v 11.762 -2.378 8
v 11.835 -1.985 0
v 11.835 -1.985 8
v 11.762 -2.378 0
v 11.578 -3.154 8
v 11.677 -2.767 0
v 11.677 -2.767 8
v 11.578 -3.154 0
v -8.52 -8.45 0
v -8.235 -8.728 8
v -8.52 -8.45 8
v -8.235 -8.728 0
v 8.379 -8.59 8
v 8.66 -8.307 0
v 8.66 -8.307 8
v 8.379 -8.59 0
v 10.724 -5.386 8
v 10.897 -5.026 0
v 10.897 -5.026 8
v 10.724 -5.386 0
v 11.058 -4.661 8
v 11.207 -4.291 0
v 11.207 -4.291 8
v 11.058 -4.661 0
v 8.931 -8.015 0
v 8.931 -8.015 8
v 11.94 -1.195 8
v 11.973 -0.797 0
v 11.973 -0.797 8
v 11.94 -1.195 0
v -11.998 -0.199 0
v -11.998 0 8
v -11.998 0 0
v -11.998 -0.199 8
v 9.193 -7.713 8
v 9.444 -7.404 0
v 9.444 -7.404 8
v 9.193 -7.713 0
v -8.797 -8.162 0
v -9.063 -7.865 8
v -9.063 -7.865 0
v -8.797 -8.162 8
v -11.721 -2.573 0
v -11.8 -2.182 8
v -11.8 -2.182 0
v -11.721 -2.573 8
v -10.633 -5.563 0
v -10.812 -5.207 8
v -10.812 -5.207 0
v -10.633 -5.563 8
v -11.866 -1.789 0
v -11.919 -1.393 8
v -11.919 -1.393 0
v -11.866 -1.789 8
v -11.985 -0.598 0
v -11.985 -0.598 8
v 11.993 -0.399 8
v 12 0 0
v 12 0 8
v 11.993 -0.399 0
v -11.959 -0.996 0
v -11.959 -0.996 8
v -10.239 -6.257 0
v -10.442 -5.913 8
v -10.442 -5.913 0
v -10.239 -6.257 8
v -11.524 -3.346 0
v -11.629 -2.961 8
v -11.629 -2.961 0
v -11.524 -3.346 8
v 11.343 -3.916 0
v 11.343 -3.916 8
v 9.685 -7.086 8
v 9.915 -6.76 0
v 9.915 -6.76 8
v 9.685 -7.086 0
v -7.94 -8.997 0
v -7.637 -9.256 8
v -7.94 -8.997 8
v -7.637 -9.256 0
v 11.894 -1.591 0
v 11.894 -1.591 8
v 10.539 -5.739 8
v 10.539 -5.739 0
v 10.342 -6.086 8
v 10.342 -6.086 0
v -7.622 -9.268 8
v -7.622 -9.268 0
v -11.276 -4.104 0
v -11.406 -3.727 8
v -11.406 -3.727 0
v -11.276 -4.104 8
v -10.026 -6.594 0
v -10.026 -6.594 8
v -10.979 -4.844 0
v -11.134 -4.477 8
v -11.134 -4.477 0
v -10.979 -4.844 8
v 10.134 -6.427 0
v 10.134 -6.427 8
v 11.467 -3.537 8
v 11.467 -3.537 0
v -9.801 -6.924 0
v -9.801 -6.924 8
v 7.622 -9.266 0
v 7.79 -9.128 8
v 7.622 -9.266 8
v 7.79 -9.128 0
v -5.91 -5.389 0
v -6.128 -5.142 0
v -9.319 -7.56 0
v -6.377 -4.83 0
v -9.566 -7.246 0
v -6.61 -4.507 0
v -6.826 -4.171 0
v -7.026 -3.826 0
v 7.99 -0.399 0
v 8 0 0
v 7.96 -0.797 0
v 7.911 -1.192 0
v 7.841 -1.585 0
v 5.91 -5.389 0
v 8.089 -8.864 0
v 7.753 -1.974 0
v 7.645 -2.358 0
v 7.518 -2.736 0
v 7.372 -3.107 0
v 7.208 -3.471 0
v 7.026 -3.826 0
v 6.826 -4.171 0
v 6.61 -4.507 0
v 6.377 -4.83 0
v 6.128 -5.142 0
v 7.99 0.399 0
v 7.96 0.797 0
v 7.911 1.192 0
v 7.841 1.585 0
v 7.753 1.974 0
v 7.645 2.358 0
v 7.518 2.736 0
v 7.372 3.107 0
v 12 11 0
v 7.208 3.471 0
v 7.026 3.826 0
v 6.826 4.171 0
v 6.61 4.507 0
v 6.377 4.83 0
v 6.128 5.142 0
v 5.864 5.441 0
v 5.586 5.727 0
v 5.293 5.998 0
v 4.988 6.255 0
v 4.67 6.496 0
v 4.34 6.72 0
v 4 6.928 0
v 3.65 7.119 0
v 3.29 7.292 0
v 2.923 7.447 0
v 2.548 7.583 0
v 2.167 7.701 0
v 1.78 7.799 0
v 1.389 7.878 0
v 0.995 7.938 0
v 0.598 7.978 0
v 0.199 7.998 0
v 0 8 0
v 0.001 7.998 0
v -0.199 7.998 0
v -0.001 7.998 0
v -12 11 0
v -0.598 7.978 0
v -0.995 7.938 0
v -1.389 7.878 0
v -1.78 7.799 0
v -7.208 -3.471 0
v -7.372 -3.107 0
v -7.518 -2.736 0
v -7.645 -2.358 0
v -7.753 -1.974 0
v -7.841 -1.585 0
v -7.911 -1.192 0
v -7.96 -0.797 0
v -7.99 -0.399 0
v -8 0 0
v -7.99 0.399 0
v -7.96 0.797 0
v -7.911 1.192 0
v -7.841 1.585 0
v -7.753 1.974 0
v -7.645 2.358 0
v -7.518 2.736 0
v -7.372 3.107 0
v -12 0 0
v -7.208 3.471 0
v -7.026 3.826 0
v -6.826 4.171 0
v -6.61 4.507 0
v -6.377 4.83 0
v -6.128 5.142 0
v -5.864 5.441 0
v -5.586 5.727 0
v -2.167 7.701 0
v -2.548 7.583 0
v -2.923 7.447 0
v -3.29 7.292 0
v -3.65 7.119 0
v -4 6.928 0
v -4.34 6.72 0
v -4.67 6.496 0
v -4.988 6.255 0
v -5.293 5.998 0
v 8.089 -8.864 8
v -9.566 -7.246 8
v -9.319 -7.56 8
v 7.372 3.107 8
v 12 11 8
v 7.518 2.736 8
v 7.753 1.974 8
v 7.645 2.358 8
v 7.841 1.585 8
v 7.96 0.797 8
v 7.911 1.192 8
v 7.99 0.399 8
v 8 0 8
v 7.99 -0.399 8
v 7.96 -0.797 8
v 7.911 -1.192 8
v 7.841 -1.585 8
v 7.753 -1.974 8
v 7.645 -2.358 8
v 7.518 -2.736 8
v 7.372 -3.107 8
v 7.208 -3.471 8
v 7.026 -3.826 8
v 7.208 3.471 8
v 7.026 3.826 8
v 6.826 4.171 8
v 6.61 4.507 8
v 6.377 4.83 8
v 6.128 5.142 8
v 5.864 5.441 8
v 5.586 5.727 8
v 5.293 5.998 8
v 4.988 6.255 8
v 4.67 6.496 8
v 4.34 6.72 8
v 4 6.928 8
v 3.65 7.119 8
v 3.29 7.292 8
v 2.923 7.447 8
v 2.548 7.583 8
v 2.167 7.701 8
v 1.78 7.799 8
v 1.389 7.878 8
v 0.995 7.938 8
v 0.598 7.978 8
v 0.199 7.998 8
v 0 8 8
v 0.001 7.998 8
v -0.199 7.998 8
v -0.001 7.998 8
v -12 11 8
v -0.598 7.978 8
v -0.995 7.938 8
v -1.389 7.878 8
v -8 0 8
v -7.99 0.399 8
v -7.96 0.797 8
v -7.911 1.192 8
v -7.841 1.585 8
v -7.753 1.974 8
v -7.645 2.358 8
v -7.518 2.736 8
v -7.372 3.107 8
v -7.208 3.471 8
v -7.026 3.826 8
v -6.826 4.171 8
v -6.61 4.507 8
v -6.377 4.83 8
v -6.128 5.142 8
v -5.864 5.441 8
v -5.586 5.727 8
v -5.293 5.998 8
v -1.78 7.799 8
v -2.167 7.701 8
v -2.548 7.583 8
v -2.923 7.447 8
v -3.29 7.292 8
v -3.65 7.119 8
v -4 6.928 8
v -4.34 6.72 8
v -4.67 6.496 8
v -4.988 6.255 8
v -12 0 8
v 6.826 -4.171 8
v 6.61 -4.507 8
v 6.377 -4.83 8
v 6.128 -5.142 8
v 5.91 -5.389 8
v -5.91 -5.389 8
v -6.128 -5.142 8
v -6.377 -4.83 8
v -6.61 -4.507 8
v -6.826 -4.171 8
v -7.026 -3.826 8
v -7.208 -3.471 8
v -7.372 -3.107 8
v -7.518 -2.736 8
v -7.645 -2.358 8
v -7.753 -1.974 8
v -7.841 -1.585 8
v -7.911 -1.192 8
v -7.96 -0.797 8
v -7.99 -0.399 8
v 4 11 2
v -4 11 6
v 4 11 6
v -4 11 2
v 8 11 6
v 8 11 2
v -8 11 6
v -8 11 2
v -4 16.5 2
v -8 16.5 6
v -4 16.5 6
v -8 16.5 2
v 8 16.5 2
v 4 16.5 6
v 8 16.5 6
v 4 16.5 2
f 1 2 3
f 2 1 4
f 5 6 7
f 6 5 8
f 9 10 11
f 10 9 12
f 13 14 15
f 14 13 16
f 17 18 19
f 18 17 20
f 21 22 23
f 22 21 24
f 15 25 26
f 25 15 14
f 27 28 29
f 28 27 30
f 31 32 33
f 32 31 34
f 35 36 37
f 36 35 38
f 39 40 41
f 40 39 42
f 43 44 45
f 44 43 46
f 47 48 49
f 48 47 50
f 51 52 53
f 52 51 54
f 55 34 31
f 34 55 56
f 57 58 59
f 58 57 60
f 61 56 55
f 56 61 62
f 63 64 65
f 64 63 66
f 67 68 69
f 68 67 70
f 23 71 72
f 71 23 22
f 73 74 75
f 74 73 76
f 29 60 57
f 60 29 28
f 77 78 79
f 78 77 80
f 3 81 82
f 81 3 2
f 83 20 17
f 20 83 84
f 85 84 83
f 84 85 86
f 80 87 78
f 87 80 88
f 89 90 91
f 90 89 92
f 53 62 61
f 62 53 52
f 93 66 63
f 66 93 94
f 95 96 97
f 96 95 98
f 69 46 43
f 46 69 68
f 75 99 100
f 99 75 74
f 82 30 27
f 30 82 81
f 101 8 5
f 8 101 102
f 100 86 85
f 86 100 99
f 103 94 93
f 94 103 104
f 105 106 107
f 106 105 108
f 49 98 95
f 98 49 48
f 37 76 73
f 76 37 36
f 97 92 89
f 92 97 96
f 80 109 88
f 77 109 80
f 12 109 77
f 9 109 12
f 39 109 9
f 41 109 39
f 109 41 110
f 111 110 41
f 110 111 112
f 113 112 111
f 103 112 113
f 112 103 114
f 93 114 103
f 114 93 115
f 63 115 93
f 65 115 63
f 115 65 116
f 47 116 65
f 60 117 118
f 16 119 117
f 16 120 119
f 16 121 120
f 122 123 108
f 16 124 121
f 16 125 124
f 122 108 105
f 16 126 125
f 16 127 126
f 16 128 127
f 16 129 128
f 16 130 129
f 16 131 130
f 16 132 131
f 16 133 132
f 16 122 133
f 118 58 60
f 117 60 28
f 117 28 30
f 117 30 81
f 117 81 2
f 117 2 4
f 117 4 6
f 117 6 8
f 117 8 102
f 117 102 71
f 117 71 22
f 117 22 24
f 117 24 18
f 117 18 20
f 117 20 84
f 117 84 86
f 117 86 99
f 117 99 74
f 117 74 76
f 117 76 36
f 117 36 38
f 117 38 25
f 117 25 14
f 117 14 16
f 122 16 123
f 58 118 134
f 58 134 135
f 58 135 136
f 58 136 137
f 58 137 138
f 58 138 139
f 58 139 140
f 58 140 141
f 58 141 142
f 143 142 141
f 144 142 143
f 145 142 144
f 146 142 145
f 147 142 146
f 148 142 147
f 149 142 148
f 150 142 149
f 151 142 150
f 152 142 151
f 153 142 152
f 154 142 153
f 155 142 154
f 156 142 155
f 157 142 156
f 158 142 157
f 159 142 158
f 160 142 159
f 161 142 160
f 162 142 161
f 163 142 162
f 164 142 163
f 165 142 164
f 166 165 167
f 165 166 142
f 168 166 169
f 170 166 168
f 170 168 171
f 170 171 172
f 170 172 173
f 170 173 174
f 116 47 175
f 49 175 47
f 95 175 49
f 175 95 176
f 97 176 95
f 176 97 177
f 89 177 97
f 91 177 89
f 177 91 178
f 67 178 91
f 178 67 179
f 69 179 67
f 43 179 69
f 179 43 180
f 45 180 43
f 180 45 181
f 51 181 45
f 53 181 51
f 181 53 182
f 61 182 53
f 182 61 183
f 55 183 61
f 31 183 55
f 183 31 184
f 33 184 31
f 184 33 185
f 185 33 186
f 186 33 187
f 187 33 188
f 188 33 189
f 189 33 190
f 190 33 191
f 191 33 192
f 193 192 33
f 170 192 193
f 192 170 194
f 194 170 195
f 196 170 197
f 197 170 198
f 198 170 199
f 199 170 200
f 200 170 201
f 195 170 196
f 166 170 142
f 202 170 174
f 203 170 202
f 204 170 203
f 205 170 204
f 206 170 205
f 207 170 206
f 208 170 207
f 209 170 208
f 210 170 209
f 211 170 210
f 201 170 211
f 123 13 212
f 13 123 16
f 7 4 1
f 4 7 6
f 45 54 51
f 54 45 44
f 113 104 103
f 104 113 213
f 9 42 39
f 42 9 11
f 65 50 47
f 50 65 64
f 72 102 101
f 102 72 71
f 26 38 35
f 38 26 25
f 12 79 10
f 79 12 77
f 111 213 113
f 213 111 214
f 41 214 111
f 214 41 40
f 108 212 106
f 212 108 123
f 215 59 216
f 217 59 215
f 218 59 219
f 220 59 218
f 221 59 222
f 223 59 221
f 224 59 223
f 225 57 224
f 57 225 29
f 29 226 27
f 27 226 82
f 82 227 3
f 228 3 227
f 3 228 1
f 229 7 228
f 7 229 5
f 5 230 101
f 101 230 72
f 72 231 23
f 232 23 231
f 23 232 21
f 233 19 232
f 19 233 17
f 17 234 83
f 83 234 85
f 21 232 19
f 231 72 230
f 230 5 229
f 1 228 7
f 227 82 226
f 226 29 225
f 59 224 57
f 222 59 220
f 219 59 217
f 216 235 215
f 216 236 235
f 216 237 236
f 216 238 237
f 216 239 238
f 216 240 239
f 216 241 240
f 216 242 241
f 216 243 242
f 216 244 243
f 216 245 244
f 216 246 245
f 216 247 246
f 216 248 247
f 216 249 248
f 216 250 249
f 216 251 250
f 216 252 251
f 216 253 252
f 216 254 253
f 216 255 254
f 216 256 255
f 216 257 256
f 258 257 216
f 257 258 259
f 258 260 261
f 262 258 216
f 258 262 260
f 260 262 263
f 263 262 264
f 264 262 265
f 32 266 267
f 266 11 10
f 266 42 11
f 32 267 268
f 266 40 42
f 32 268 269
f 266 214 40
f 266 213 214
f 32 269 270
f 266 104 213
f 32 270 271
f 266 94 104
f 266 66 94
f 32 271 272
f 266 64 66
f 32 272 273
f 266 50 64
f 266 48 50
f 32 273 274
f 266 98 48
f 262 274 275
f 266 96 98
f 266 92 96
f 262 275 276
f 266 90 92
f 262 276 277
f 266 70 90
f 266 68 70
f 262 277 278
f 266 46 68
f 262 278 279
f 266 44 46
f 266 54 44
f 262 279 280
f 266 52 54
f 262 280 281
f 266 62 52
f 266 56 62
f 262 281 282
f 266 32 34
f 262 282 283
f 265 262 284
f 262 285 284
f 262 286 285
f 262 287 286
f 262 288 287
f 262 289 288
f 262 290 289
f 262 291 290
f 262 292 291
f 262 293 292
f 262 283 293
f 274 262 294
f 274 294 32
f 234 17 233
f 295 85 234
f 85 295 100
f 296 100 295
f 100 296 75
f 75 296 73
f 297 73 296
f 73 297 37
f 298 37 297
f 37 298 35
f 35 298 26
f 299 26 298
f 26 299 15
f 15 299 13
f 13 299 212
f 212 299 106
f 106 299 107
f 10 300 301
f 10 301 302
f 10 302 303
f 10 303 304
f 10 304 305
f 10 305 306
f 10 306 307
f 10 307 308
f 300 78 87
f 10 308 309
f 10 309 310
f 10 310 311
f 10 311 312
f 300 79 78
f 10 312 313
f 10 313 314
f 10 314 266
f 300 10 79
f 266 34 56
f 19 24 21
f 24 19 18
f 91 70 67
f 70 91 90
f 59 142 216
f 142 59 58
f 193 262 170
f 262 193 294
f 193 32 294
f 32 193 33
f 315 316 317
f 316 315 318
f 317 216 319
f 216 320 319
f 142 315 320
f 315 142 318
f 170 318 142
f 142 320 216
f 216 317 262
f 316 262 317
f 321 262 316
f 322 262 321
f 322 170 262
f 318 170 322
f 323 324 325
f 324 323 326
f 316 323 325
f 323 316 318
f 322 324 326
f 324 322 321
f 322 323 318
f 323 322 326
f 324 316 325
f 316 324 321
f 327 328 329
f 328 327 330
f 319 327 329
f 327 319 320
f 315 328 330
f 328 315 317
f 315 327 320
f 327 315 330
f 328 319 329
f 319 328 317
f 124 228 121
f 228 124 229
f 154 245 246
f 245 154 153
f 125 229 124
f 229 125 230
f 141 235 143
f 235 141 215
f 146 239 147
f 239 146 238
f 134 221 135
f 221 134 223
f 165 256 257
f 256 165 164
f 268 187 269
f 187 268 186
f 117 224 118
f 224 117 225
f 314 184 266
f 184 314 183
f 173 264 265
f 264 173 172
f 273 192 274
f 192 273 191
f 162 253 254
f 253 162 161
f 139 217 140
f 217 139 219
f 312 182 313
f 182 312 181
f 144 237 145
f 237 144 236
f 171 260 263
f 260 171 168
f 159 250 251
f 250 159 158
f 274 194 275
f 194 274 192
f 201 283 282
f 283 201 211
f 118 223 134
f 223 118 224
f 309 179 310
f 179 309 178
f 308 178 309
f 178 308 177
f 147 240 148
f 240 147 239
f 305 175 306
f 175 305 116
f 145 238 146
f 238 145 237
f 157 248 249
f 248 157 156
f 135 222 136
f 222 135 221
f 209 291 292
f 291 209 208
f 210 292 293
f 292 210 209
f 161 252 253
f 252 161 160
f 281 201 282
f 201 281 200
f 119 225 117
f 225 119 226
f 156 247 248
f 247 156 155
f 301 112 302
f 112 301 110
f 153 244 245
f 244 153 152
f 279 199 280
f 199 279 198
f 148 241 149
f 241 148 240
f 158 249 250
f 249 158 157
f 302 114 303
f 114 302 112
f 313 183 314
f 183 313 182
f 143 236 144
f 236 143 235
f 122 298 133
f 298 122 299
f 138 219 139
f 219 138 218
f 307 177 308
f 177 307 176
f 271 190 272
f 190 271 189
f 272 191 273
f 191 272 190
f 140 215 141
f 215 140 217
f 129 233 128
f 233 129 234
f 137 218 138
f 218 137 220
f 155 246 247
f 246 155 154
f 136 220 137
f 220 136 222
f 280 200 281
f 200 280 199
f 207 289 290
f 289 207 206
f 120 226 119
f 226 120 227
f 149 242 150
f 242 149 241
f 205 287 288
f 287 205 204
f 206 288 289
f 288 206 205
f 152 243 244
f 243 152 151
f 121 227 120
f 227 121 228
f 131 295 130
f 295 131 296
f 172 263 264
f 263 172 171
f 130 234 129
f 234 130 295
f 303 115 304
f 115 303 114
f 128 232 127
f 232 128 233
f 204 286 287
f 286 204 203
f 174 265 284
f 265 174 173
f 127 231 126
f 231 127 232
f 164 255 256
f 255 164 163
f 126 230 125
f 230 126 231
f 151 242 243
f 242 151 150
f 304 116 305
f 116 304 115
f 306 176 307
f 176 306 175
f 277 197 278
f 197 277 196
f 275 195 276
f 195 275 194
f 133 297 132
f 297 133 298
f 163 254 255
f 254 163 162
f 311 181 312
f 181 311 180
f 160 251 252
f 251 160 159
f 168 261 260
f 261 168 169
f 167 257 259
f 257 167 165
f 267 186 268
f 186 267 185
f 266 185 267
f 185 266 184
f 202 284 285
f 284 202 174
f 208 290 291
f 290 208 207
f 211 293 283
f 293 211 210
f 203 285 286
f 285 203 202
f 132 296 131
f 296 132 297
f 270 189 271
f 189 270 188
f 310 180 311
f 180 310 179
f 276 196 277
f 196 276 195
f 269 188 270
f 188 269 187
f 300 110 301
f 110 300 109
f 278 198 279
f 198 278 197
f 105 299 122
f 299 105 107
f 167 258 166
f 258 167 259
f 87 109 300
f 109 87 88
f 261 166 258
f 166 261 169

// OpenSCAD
// file: connector.scad
include <common.scad>

module connector_pin() {
    translate([0, 0, (CONNECTOR_DEPTH - LOOSE_FIT) / 2])
        cube([CONNECTOR_WIDTH, CONNECTOR_WIDTH, CONNECTOR_DEPTH - LOOSE_FIT], center = true);
}

module connector_hole() {
    translate([0, 0, CONNECTOR_DEPTH / 2])
        cube([CONNECTOR_WIDTH, CONNECTOR_WIDTH, CONNECTOR_DEPTH], center = true);
}
// file: common.scad
$fa = 1;
$fs = .4;

// Fit tolerances
PRESS_FIT = 0;
TIGHT_FIT = .13;
NORMAL_FIT = .250;
LOOSE_FIT = .5;

DELTA = .01;

// Bar
BAR_LENGTH = 150;
BAR_WIDTH = 8;

// Connector
CONNECTOR_WIDTH = 4;
CONNECTOR_DEPTH = 6;

// Clip
CLIP_HOLE_R = 8;
CLIP_WALL = 4;
CLIP_REDUCE = 1;
CLIP_ANGLE = 30;

// Clip positition
BAR_CLIP_POS = 120;
// main file
include <common.scad>
include <connector.scad>

body_r = CLIP_HOLE_R + CLIP_WALL;

module clip_connector_pin() {
    translate([0, body_r - CLIP_REDUCE, BAR_WIDTH / 2])
        rotate([-90, 0, 0])
            connector_pin();
}

difference () {
    union() {
        difference() {
            union() {
                // Clip round part of body
                cylinder(BAR_WIDTH, body_r, body_r);

                // Clip rectangular part of body
                translate([-body_r, 0, 0])
                    cube([2 * body_r, body_r, BAR_WIDTH]);
            }

            // Clip reduce size of the rectangular part, it looks better
            translate([-body_r - DELTA, body_r - CLIP_REDUCE, -DELTA])
                cube([2 * body_r + 2 * DELTA, CLIP_WALL, BAR_WIDTH + 2 * DELTA]);
        }

        translate([-body_r / 2, 0, 0])
            clip_connector_pin();
        translate([body_r / 2, 0, 0])
            clip_connector_pin();
    }

    union() {
        // Clip hole round part
        translate([0, 0, -DELTA])
            cylinder(BAR_WIDTH + 2 * DELTA, CLIP_HOLE_R, CLIP_HOLE_R);

        // Slot
        translate([0, 0, -DELTA])
            linear_extrude(height = BAR_WIDTH + 2 * DELTA)
                polygon(points = [
                    [0, CLIP_HOLE_R], 
                    [-30*sin(CLIP_ANGLE), -30*cos(CLIP_ANGLE)],
                    [30*sin(CLIP_ANGLE), -30*cos(CLIP_ANGLE)]]);
    }
}
